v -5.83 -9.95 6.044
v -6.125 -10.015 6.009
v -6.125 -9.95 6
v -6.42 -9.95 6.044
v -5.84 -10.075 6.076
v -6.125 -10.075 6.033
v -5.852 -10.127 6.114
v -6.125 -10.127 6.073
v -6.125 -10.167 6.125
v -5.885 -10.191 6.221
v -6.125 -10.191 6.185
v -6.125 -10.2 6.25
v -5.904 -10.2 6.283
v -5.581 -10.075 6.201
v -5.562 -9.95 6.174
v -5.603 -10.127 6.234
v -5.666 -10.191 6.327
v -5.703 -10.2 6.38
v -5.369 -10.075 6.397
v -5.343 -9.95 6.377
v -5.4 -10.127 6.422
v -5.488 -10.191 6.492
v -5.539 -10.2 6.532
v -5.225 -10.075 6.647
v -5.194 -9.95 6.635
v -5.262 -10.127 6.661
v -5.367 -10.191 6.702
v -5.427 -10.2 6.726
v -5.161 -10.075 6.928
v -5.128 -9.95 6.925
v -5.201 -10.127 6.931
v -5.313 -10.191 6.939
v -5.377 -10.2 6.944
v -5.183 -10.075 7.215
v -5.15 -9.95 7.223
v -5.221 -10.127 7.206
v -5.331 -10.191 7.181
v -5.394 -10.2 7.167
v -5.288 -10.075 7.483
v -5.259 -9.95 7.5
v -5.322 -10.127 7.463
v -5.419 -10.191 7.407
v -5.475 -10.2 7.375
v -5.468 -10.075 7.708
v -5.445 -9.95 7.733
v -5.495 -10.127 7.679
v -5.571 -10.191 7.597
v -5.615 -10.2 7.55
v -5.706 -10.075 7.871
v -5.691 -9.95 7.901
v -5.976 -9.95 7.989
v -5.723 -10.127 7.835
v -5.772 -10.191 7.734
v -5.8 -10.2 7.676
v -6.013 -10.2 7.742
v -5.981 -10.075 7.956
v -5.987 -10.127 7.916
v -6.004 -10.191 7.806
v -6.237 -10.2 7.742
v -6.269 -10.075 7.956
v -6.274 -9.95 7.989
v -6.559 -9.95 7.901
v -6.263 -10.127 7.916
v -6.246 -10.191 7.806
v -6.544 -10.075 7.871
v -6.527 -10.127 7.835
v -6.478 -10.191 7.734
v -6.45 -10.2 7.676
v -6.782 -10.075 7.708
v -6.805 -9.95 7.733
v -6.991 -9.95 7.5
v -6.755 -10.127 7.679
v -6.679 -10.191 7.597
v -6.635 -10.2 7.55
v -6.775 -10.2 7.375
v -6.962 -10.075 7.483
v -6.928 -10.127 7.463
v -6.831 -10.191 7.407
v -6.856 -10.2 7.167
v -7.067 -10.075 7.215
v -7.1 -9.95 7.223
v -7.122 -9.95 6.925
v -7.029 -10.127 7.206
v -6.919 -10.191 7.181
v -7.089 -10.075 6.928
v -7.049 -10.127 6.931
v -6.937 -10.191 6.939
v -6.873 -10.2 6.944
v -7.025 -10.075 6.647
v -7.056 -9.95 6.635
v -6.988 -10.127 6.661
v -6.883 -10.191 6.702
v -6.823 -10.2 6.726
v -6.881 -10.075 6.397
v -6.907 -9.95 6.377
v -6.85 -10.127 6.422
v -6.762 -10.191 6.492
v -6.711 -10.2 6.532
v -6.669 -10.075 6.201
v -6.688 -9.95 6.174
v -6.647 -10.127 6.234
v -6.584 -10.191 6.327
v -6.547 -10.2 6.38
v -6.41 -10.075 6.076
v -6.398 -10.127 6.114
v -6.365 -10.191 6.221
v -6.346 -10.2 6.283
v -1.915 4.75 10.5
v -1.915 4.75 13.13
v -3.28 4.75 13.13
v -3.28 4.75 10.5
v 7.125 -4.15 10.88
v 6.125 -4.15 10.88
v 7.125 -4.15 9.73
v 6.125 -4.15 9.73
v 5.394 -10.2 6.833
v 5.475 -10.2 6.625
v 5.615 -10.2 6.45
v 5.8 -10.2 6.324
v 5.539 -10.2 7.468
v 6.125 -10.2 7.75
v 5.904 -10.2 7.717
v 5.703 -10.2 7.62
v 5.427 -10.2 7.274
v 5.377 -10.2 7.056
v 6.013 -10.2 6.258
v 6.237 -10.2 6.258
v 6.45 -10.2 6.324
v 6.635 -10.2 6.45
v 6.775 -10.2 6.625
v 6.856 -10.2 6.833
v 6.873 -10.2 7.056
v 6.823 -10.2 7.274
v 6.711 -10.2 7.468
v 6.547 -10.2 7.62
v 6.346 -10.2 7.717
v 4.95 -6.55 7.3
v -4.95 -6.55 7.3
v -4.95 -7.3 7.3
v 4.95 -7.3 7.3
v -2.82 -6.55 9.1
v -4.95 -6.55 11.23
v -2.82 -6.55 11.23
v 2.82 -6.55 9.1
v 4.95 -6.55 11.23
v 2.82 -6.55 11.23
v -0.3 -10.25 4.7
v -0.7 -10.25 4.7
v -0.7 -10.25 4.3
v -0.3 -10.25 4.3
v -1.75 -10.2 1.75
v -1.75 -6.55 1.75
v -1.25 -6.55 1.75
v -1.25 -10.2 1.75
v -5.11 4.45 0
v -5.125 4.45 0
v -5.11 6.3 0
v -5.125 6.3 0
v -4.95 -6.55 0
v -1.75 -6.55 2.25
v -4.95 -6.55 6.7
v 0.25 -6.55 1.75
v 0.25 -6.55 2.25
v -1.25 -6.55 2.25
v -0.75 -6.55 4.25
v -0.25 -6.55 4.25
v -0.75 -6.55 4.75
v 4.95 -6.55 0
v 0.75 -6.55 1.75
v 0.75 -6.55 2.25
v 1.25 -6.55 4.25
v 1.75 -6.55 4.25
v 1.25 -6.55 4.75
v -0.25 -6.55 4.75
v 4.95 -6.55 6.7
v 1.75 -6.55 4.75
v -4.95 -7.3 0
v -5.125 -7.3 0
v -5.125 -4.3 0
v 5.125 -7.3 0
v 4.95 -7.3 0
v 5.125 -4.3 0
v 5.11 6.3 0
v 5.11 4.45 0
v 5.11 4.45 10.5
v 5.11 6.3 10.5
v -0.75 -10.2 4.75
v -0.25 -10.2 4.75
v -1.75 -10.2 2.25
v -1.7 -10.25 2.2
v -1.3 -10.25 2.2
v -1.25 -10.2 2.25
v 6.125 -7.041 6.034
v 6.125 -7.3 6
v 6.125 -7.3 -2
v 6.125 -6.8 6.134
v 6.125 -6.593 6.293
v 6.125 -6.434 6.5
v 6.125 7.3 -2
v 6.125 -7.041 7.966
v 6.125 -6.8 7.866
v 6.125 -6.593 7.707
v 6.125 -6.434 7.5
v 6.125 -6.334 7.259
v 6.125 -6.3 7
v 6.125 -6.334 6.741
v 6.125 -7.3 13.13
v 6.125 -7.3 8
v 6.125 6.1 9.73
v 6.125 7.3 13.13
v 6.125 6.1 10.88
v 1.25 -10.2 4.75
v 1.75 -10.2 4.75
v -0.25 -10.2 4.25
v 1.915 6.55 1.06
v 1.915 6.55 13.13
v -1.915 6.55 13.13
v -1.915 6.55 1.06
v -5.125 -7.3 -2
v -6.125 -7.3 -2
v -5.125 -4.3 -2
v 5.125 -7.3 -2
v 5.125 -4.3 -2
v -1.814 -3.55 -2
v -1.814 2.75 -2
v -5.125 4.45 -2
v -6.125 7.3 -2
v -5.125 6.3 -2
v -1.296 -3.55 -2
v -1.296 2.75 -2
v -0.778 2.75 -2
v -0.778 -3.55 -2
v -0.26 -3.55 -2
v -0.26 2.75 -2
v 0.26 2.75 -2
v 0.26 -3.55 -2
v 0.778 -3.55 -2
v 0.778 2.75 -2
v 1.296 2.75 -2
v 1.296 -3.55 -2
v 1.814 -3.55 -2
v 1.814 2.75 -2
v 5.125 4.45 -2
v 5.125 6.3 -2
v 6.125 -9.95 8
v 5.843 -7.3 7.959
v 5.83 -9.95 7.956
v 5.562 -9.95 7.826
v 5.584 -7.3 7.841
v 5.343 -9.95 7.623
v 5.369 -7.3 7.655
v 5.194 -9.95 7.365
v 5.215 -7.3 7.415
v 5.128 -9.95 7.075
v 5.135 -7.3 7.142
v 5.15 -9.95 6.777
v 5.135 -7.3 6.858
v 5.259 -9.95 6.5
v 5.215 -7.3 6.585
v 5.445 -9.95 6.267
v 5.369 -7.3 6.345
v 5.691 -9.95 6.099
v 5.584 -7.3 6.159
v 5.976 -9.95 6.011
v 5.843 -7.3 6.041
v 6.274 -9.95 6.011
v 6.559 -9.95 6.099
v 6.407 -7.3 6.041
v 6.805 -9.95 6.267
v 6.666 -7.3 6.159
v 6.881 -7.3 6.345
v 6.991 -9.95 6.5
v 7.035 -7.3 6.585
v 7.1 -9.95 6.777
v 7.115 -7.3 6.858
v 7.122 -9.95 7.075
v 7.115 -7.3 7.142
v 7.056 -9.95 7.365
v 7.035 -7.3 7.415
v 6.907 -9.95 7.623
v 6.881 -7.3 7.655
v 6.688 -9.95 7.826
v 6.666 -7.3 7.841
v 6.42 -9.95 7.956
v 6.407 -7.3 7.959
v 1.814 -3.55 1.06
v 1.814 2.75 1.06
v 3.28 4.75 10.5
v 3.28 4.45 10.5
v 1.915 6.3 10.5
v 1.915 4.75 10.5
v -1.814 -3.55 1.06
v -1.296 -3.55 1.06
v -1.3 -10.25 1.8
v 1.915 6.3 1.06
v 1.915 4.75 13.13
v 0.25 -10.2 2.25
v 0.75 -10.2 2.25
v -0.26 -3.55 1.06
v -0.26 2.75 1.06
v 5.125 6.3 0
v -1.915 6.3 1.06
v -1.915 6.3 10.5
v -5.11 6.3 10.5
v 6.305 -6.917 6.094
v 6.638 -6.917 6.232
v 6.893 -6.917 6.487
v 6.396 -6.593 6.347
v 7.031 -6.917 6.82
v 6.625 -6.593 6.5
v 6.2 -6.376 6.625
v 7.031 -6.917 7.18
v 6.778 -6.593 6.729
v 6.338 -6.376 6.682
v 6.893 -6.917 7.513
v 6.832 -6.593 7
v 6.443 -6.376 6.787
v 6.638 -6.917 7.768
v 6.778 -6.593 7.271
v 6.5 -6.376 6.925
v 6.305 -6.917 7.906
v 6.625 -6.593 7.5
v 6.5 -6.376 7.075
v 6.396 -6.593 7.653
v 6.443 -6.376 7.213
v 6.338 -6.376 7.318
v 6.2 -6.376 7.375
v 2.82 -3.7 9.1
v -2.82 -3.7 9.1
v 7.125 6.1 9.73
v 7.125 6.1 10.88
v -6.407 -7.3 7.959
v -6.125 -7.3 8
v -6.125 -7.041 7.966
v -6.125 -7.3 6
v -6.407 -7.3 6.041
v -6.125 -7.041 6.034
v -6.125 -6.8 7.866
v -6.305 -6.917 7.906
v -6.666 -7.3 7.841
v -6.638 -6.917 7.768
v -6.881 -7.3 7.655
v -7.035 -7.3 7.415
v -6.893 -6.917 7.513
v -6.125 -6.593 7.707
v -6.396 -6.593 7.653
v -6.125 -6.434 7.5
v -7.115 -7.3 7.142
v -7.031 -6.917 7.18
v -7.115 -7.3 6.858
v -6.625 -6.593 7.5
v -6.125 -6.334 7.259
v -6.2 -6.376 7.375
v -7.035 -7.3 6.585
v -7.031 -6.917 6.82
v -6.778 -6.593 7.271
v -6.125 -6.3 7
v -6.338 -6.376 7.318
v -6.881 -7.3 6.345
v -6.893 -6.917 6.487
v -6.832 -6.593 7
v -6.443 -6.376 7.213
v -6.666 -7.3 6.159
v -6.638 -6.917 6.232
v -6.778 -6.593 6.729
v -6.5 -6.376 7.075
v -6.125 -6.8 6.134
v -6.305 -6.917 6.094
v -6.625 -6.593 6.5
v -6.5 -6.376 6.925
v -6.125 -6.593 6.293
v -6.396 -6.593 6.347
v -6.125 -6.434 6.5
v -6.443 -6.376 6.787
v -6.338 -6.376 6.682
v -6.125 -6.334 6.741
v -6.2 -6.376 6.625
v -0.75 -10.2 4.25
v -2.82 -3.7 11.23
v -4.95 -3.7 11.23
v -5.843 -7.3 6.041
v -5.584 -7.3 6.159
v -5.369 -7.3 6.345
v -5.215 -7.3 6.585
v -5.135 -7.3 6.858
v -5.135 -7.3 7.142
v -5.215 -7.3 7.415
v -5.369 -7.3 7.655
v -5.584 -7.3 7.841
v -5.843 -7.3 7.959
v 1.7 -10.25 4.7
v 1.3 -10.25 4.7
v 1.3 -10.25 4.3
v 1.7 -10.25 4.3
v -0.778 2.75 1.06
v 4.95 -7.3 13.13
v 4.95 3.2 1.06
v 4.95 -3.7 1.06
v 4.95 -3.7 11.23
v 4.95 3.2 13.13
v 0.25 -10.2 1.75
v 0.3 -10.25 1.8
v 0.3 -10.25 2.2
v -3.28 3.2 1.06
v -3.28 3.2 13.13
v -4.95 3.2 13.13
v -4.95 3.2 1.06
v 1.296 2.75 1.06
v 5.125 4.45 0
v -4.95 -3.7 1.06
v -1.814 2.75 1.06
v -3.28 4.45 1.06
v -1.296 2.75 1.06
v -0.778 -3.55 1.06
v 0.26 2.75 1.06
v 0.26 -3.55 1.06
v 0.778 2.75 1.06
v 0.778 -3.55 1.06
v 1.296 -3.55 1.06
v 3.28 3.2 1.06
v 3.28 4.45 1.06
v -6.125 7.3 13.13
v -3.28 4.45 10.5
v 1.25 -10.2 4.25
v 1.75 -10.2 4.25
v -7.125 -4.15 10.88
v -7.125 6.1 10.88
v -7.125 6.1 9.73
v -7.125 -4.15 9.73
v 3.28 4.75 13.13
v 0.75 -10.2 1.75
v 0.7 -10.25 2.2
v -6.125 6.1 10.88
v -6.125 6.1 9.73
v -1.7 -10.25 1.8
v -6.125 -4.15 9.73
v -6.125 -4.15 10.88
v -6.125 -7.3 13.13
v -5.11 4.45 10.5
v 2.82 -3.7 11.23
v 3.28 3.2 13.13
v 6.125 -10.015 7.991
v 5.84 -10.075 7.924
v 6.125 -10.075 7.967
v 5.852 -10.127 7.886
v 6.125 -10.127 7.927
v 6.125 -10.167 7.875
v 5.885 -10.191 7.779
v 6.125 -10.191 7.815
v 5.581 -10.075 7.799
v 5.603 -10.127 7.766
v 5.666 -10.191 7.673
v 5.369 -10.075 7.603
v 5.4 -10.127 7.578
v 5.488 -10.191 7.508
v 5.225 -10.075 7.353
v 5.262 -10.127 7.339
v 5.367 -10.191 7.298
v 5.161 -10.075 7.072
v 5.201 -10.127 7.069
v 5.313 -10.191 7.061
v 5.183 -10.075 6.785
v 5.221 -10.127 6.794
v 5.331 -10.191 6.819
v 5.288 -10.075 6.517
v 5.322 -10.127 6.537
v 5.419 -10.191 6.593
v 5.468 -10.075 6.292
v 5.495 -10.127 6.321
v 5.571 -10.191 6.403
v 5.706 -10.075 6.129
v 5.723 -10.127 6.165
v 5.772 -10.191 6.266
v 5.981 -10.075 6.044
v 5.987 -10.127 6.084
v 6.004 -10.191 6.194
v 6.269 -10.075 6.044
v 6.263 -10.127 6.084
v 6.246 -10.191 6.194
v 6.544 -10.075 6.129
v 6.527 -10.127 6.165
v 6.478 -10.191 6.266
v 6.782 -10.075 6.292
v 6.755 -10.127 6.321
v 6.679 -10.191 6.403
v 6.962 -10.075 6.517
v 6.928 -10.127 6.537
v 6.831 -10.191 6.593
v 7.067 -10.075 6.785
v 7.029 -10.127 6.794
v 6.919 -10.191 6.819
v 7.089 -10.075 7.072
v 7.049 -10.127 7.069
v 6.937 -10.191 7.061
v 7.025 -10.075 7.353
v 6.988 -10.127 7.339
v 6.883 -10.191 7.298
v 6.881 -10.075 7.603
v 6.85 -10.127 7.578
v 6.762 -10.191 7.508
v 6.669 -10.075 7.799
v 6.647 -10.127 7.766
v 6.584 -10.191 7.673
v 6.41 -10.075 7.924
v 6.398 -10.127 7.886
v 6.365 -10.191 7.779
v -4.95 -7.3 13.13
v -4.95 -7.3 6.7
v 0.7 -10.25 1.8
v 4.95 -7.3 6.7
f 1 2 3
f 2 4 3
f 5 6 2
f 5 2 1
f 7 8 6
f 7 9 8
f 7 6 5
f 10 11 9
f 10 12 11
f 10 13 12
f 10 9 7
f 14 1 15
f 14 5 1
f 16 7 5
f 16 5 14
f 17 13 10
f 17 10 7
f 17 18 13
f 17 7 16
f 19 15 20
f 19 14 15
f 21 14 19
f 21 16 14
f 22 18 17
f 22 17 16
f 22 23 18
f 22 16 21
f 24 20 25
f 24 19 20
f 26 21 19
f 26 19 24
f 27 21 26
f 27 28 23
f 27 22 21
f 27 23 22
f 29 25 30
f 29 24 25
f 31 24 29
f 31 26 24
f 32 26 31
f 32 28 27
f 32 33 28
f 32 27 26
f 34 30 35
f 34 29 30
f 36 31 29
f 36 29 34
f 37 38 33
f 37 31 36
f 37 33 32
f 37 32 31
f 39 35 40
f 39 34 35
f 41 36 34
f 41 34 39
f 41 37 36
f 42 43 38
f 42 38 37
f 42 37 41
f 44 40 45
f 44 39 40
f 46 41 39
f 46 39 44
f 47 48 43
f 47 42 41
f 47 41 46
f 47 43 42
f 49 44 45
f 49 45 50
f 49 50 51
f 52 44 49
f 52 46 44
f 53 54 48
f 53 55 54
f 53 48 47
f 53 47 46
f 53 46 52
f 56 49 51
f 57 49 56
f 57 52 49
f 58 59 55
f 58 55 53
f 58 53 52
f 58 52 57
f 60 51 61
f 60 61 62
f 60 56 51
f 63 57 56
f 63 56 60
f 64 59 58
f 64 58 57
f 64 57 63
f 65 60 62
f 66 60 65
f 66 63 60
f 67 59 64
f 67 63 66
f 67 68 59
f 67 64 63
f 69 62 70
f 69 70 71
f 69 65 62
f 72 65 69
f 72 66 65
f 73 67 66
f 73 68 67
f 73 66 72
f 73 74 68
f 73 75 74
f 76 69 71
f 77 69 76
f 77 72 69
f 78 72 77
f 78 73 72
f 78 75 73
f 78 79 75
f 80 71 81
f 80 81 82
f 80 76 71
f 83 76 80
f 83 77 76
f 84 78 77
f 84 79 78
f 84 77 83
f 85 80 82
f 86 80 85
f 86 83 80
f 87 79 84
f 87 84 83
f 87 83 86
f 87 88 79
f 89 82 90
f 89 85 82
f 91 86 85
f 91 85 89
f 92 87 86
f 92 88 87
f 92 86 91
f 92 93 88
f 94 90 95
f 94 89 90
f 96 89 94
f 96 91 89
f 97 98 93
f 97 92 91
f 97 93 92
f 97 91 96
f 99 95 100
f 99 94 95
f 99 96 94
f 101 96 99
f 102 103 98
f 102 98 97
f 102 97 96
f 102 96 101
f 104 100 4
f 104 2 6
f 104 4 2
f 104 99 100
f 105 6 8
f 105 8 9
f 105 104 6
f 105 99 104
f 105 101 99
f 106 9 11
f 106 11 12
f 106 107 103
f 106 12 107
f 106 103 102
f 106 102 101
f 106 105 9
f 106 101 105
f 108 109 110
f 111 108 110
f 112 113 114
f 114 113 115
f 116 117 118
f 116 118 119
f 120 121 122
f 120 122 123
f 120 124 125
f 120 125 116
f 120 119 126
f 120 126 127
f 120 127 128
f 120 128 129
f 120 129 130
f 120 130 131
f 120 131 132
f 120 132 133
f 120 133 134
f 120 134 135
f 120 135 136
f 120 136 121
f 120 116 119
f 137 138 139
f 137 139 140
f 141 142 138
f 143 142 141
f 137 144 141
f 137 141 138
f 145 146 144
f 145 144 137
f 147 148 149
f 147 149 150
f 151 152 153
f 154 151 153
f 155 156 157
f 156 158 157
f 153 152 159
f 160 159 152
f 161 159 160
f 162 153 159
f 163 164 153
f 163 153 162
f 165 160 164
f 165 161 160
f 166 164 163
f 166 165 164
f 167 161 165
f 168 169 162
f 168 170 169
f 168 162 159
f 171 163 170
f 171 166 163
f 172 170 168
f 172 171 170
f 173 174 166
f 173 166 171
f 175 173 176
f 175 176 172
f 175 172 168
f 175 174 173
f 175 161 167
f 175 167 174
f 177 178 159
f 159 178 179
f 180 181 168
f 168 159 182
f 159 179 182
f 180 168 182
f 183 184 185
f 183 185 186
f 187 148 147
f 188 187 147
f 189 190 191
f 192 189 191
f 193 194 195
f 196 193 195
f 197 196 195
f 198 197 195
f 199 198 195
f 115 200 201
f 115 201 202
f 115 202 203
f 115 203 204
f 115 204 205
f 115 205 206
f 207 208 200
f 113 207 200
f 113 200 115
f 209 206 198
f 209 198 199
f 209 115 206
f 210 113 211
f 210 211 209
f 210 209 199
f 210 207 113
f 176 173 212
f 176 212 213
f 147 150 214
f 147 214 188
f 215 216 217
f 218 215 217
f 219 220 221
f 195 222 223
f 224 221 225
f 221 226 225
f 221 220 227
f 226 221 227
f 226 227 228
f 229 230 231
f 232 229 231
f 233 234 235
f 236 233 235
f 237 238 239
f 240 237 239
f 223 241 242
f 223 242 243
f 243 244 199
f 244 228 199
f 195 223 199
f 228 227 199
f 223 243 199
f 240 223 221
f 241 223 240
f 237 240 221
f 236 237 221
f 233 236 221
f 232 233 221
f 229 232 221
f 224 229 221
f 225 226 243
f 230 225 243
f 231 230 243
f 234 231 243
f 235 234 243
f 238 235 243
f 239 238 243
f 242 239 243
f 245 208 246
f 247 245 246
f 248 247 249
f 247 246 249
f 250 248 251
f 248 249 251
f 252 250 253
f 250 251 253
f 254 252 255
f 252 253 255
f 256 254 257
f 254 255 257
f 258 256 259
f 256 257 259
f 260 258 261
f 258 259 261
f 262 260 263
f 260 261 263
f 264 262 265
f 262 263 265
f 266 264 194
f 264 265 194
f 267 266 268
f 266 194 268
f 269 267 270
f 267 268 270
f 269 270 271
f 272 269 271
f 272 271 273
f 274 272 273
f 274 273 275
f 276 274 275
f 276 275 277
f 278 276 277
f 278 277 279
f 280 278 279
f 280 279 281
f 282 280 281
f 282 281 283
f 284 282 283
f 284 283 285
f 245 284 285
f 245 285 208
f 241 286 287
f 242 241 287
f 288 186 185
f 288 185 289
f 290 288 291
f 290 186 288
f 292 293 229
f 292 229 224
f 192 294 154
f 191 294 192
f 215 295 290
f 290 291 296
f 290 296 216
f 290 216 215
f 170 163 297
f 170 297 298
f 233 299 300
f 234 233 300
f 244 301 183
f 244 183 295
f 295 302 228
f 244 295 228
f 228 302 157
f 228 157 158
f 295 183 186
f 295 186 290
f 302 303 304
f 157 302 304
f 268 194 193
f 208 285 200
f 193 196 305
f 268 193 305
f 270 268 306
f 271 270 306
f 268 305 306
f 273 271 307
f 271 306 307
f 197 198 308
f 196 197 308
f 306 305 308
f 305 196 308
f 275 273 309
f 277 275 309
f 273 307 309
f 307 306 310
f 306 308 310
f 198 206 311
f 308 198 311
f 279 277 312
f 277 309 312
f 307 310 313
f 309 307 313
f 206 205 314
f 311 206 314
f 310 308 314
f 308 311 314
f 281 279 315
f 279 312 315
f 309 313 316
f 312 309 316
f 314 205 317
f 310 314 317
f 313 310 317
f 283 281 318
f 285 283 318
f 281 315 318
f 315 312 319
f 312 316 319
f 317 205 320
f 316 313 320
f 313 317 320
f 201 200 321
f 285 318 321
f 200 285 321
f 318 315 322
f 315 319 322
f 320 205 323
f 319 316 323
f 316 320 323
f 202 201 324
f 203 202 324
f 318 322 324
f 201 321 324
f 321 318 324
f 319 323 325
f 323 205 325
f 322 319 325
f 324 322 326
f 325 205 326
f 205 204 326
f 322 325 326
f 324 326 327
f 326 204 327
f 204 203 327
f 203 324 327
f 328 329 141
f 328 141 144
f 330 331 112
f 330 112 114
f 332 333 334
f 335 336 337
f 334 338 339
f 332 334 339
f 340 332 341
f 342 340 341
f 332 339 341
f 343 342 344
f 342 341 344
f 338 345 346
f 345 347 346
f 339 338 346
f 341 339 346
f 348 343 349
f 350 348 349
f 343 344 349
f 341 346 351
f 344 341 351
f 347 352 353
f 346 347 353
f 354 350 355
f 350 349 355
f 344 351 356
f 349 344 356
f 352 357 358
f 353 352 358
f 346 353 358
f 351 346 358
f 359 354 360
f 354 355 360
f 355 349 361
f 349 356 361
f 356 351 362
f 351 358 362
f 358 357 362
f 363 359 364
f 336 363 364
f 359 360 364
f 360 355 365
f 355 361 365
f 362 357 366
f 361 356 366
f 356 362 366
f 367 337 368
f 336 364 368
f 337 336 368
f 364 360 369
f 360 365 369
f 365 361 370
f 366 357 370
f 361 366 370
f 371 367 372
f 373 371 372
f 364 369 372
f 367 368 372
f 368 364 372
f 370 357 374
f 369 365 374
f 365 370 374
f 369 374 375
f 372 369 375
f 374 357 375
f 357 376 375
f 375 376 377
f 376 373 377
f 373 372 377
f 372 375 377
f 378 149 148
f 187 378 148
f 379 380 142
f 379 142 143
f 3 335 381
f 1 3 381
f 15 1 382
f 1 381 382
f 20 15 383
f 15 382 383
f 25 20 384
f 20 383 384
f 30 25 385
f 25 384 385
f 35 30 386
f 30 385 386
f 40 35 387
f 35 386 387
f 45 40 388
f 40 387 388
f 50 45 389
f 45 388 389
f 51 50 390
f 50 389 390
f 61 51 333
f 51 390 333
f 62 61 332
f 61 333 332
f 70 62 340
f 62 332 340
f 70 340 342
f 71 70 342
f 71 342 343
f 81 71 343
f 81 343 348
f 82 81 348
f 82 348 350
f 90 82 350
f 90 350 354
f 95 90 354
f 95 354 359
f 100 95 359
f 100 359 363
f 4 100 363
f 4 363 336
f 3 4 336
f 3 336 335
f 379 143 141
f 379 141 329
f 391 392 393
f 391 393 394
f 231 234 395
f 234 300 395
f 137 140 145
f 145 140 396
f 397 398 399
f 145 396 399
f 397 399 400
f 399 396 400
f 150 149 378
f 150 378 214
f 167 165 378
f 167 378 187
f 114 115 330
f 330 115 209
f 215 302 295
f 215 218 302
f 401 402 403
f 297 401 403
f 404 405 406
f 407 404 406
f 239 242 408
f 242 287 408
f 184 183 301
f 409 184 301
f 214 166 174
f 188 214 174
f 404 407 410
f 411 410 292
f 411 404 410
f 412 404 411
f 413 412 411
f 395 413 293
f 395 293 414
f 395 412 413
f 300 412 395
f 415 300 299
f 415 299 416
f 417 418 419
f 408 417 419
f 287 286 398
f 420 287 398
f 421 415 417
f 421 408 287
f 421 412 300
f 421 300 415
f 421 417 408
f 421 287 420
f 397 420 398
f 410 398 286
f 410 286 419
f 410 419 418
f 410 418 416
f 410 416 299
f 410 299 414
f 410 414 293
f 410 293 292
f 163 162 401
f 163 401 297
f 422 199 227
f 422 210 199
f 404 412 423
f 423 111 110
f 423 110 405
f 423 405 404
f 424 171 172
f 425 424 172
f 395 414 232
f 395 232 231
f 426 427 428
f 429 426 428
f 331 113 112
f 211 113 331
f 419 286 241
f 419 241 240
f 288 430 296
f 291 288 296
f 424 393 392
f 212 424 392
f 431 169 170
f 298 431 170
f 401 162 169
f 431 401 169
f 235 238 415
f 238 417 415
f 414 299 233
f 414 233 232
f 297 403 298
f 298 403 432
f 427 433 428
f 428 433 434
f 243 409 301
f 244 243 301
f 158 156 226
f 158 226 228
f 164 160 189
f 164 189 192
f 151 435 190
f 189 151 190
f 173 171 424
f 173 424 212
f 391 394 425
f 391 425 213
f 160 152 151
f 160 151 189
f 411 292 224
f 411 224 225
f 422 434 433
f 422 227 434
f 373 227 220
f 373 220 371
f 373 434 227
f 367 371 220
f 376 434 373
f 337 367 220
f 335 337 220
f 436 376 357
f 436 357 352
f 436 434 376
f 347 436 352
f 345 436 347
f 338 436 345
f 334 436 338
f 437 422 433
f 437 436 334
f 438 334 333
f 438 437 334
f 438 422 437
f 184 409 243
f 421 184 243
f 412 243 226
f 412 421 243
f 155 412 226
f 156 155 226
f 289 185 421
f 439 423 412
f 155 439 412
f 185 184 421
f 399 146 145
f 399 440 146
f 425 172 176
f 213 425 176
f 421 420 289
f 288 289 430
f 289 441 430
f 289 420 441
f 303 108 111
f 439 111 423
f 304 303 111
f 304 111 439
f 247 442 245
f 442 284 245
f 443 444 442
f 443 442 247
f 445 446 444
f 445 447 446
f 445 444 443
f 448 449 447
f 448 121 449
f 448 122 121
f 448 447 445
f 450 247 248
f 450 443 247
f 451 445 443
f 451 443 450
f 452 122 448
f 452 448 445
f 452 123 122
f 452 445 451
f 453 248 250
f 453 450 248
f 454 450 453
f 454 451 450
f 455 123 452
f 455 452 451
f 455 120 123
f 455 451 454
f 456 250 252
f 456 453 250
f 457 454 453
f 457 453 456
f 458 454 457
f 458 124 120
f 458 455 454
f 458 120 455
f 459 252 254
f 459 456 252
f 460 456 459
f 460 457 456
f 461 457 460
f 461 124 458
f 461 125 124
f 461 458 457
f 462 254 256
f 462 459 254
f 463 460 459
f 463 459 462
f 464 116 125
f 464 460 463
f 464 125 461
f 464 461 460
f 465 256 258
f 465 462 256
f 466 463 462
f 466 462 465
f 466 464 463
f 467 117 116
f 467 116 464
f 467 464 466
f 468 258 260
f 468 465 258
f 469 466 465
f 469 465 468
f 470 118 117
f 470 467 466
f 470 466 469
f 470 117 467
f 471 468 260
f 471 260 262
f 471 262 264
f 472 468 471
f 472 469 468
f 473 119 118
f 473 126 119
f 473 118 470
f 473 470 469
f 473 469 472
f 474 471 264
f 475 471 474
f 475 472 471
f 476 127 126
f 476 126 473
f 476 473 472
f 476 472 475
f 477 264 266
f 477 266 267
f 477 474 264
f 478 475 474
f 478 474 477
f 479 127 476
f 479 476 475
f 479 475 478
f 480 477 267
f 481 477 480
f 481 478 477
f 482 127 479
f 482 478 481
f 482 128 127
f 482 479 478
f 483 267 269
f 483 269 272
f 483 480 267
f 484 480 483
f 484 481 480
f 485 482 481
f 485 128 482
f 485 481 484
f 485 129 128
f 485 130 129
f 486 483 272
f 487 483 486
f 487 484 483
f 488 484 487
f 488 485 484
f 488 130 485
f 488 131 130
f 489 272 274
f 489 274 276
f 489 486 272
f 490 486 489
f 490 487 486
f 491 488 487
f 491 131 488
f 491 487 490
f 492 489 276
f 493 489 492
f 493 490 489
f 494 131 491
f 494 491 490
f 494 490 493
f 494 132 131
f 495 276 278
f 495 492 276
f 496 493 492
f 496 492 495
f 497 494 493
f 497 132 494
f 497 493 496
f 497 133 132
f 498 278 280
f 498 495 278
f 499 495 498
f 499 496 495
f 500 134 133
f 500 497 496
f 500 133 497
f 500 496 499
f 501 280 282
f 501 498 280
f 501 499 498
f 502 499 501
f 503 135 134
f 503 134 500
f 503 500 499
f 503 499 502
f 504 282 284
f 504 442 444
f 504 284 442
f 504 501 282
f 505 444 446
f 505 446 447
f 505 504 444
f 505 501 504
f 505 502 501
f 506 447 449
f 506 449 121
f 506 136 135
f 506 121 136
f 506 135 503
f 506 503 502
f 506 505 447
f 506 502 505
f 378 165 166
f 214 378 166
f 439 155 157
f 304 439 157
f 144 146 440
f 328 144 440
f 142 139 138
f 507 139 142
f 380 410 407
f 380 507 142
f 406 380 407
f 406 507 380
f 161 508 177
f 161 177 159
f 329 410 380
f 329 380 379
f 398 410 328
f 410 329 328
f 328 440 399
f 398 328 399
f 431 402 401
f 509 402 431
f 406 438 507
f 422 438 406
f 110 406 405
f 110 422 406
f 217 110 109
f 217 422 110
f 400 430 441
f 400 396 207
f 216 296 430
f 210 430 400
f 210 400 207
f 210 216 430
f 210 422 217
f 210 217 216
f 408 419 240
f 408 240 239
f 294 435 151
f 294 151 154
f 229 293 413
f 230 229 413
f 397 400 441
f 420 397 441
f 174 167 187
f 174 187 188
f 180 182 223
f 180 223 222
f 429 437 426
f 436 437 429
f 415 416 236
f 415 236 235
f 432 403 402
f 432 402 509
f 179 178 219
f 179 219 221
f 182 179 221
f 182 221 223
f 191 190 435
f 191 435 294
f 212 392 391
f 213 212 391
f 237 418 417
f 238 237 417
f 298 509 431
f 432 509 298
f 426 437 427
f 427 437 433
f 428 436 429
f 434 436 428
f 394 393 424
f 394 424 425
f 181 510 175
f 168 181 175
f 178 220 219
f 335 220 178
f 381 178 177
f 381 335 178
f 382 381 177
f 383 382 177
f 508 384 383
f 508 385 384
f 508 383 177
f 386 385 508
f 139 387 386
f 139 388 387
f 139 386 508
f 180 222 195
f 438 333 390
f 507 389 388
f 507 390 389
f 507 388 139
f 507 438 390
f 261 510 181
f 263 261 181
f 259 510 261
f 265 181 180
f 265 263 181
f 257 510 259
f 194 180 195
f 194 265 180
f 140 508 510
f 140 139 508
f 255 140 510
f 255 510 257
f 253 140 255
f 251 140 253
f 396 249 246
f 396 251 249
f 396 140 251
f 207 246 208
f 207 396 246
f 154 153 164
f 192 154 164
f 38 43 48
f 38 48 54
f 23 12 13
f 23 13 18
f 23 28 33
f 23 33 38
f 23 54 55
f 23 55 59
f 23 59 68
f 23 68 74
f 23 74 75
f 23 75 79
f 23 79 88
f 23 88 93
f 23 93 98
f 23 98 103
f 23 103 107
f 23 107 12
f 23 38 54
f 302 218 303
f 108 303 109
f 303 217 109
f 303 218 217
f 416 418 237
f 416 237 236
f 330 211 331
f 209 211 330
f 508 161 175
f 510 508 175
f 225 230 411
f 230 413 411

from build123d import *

# Parameters (mm, degrees)
SKETCH1_W           = 12.25
SKETCH1_H           = 14.6
BOSS_EXTRUDE1_DEPTH = 13.13
CUT_EXTRUDE1_DEPTH  = 12.07
SKETCH4_W           = 10.22
SKETCH4_H           = 1.85
CUT_EXTRUDE3_DEPTH  = 10.5
CUT_EXTRUDE4_REACH  = 18.224
SKETCH5_W           = 0.518
SKETCH5_H           = 6.3
SKETCH6_W           = 9.9
SKETCH6_H           = 3.6
CUT_EXTRUDE5_DEPTH  = 1.9
SKETCH10_W          = 5.64
SKETCH10_H          = 2.85
CUT_EXTRUDE7_DEPTH  = 2.13
SKETCH11_W          = 9.9
SKETCH11_H          = 0.75
CUT_EXTRUDE8_DEPTH  = 15.728154161
SKETCH12_R          = 1
BOSS_EXTRUDE2_DEPTH = 2.9
FILLET1_R           = 0.25
SKETCH15_W          = 0.5
SKETCH15_H          = 0.5
BOSS_EXTRUDE3_DEPTH = 3.7
CHAMFER1_SIZE       = 0.05
SKETCH16_W          = 9.9
SKETCH16_H          = 0.6
BOSS_EXTRUDE4_DEPTH = 0.75
SKETCH17_W          = 0.518
SKETCH17_H          = 6.3
SKETCH17_W_2        = 10.25
SKETCH17_H_2        = 1.85
BOSS_EXTRUDE5_DEPTH = 2
SKETCH18_W          = 1.15
SKETCH18_H          = 10.25
BOSS_EXTRUDE6_DEPTH = 1


with BuildPart() as part:
    # Sketch1 → Boss-Extrude1 (new body)
    with BuildSketch(Plane.XY):
        Rectangle(SKETCH1_W, SKETCH1_H)
    extrude(amount=BOSS_EXTRUDE1_DEPTH)

    # Sketch2 → Cut-Extrude1 (cut)
    with BuildSketch(Plane.XY.offset(13.13)):
        Polygon((3.28, 3.2), (3.28, 4.75), (1.915, 4.75), (1.915, 6.55), (-1.915, 6.55), (-1.915, 4.75), (-3.28, 4.75), (-3.28, 3.2), (-4.95, 3.2), (-4.95, -3.7), (4.95, -3.7), (4.95, 3.2), align=None)
    extrude(amount=-CUT_EXTRUDE1_DEPTH, mode=Mode.SUBTRACT)

    # Sketch4 → Cut-Extrude3 (cut)
    with BuildSketch(Plane(origin=(0, 0, 0), x_dir=(-1, 0, 0), z_dir=(0, 0, -1))):
        with Locations((0, 5.375)):
            Rectangle(SKETCH4_W, SKETCH4_H)
    extrude(amount=-CUT_EXTRUDE3_DEPTH, mode=Mode.SUBTRACT)

    # Sketch5 → Cut-Extrude4 (cut, up to next)
    with BuildSketch(Plane(origin=(0, 0, 0), x_dir=(-1, 0, 0), z_dir=(0, 0, -1)), mode=Mode.PRIVATE) as cut_extrude4_sk1:
        with Locations((-1.555, -0.4)):
            Rectangle(SKETCH5_W, SKETCH5_H)
    cut_extrude4_tool1 = extrude(cut_extrude4_sk1.sketch, amount=-CUT_EXTRUDE4_REACH, mode=Mode.PRIVATE) & part.part
    # Sketch5 → Cut-Extrude4 (cut, up to next)
    with BuildSketch(Plane(origin=(0, 0, 0), x_dir=(-1, 0, 0), z_dir=(0, 0, -1)), mode=Mode.PRIVATE) as cut_extrude4_sk2:
        with Locations((-0.519, -0.4)):
            Rectangle(SKETCH5_W, SKETCH5_H)
    cut_extrude4_tool2 = extrude(cut_extrude4_sk2.sketch, amount=-CUT_EXTRUDE4_REACH, mode=Mode.PRIVATE) & part.part
    # Sketch5 → Cut-Extrude4 (cut, up to next)
    with BuildSketch(Plane(origin=(0, 0, 0), x_dir=(-1, 0, 0), z_dir=(0, 0, -1)), mode=Mode.PRIVATE) as cut_extrude4_sk3:
        with Locations((0.519, -0.4)):
            Rectangle(SKETCH5_W, SKETCH5_H)
    cut_extrude4_tool3 = extrude(cut_extrude4_sk3.sketch, amount=-CUT_EXTRUDE4_REACH, mode=Mode.PRIVATE) & part.part
    # Sketch5 → Cut-Extrude4 (cut, up to next)
    with BuildSketch(Plane(origin=(0, 0, 0), x_dir=(-1, 0, 0), z_dir=(0, 0, -1)), mode=Mode.PRIVATE) as cut_extrude4_sk4:
        with Locations((1.555, -0.4)):
            Rectangle(SKETCH5_W, SKETCH5_H)
    cut_extrude4_tool4 = extrude(cut_extrude4_sk4.sketch, amount=-CUT_EXTRUDE4_REACH, mode=Mode.PRIVATE) & part.part
    add(cut_extrude4_tool1.solids().sort_by_distance((1.555, -0.4, 0))[0], mode=Mode.SUBTRACT)
    add(cut_extrude4_tool2.solids().sort_by_distance((0.519, -0.4, 0))[0], mode=Mode.SUBTRACT)
    add(cut_extrude4_tool3.solids().sort_by_distance((-0.519, -0.4, 0))[0], mode=Mode.SUBTRACT)
    add(cut_extrude4_tool4.solids().sort_by_distance((-1.555, -0.4, 0))[0], mode=Mode.SUBTRACT)

    # Sketch6 → Cut-Extrude5 (cut)
    with BuildSketch(Plane.XY.offset(13.13)):
        with Locations((0, -5.5)):
            Rectangle(SKETCH6_W, SKETCH6_H)
    extrude(amount=-CUT_EXTRUDE5_DEPTH, mode=Mode.SUBTRACT)

    # Sketch10 → Cut-Extrude7 (cut)
    with BuildSketch(Plane.XY.offset(11.23)):
        with Locations((0, -5.125)):
            Rectangle(SKETCH10_W, SKETCH10_H)
    extrude(amount=-CUT_EXTRUDE7_DEPTH, mode=Mode.SUBTRACT)

    # Sketch11 → Cut-Extrude8 (cut, through all)
    with BuildSketch(Plane.XY.offset(11.23)):
        with Locations((0, -6.925)):
            Rectangle(SKETCH11_W, SKETCH11_H)
    extrude(amount=-CUT_EXTRUDE8_DEPTH, mode=Mode.SUBTRACT)

    # Sketch12 → Boss-Extrude2 (add)
    with BuildSketch(Plane.XZ.offset(7.3)):
        with Locations(Location((-6.125, 7, 0), (0, 0, 270))):
            Circle(SKETCH12_R)
        with Locations(Location((6.125, 7, 0), (0, 0, 90))):
            Circle(SKETCH12_R)
    extrude(amount=BOSS_EXTRUDE2_DEPTH)

    # Sketch13 → Revolve1 (revolve)
    with BuildSketch(Plane(origin=(6.125, 0, 0), x_dir=(0, 0, -1), z_dir=(1, 0, 0))):
        with BuildLine():
            Line((-7, -6.3), (-7, -7.3))
            Line((-7, -7.3), (-8, -7.3))
            ThreePointArc((-8, -7.3), (-7.707106781, -6.592893219), (-7, -6.3))
        make_face()
    revolve(axis=Axis((6.125, -6.3, 7), (0, -1, 0)))

    # Sketch14 → Revolve2 (revolve)
    with BuildSketch(Plane.ZY.offset(6.125)):
        with BuildLine():
            Line((7, -6.3), (7, -7.3))
            Line((7, -7.3), (6, -7.3))
            ThreePointArc((6, -7.3), (6.292893219, -6.592893219), (7, -6.3))
        make_face()
    revolve(axis=Axis((-6.125, -6.3, 7), (0, -1, 0)))

    # Fillet1
    fillet1_edges = [part.edges().sort_by_distance(p)[0] for p in [
        (-6.125, -10.2, 8),
        (6.125, -10.2, 6),
    ]]
    fillet(fillet1_edges, radius=FILLET1_R)

    # Sketch15 → Boss-Extrude3 (add)
    with BuildSketch(Plane.XZ.offset(6.55)):
        with Locations((-0.5, 4.5)):
            Rectangle(SKETCH15_W, SKETCH15_H)
        with Locations((-1.5, 2)):
            Rectangle(SKETCH15_W, SKETCH15_H)
        with Locations((0.5, 2)):
            Rectangle(SKETCH15_W, SKETCH15_H)
        with Locations((1.5, 4.5)):
            Rectangle(SKETCH15_W, SKETCH15_H)
    extrude(amount=BOSS_EXTRUDE3_DEPTH)

    # Chamfer1
    chamfer1_edges = [part.edges().sort_by_distance(p)[0] for p in [
        (-0.25, -10.25, 4.5),
        (-0.5, -10.25, 4.75),
        (-0.75, -10.25, 4.5),
        (-0.5, -10.25, 4.25),
        (-1.25, -10.25, 2),
        (-1.5, -10.25, 2.25),
        (-1.75, -10.25, 2),
        (-1.5, -10.25, 1.75),
        (0.75, -10.25, 2),
        (0.5, -10.25, 2.25),
        (0.25, -10.25, 2),
        (0.5, -10.25, 1.75),
        (1.75, -10.25, 4.5),
        (1.5, -10.25, 4.75),
        (1.25, -10.25, 4.5),
        (1.5, -10.25, 4.25),
    ]]
    chamfer(chamfer1_edges, length=CHAMFER1_SIZE)

    # Sketch16 → Boss-Extrude4 (add)
    with BuildSketch(Plane.XZ.offset(6.55)):
        with Locations((0, 7)):
            Rectangle(SKETCH16_W, SKETCH16_H)
    extrude(amount=BOSS_EXTRUDE4_DEPTH)

    # Sketch17 → Boss-Extrude5 (add)
    with BuildSketch(Plane(origin=(0, 0, 0), x_dir=(-1, 0, 0), z_dir=(0, 0, -1))):
        Polygon((-6.125, 7.3), (6.125, 7.3), (6.125, -7.3), (5.125, -7.3), (5.125, -4.3), (-5.125, -4.3), (-5.125, -7.3), (-6.125, -7.3), align=None)
        with Locations((-1.555, -0.4)):
            Rectangle(SKETCH17_W, SKETCH17_H, mode=Mode.SUBTRACT)
        with Locations((-0.519, -0.4)):
            Rectangle(SKETCH17_W, SKETCH17_H, mode=Mode.SUBTRACT)
        with Locations((0.519, -0.4)):
            Rectangle(SKETCH17_W, SKETCH17_H, mode=Mode.SUBTRACT)
        with Locations((1.555, -0.4)):
            Rectangle(SKETCH17_W, SKETCH17_H, mode=Mode.SUBTRACT)
        with Locations((0, 5.375)):
            Rectangle(SKETCH17_W_2, SKETCH17_H_2, mode=Mode.SUBTRACT)
    extrude(amount=BOSS_EXTRUDE5_DEPTH)

    # Sketch18 → Boss-Extrude6 (add)
    with BuildSketch(Plane(origin=(6.125, 0, 0), x_dir=(0, 0, -1), z_dir=(1, 0, 0))):
        with Locations((-10.305, 0.975)):
            Rectangle(SKETCH18_W, SKETCH18_H)
    boss_extrude6 = extrude(amount=BOSS_EXTRUDE6_DEPTH)

    # Mirror1: Boss-Extrude6 across plane
    add(boss_extrude6.mirror(Plane(origin=(0, 0, 0), x_dir=(0, 0, 1), z_dir=(1, 0, 0))))


solid = part.part
